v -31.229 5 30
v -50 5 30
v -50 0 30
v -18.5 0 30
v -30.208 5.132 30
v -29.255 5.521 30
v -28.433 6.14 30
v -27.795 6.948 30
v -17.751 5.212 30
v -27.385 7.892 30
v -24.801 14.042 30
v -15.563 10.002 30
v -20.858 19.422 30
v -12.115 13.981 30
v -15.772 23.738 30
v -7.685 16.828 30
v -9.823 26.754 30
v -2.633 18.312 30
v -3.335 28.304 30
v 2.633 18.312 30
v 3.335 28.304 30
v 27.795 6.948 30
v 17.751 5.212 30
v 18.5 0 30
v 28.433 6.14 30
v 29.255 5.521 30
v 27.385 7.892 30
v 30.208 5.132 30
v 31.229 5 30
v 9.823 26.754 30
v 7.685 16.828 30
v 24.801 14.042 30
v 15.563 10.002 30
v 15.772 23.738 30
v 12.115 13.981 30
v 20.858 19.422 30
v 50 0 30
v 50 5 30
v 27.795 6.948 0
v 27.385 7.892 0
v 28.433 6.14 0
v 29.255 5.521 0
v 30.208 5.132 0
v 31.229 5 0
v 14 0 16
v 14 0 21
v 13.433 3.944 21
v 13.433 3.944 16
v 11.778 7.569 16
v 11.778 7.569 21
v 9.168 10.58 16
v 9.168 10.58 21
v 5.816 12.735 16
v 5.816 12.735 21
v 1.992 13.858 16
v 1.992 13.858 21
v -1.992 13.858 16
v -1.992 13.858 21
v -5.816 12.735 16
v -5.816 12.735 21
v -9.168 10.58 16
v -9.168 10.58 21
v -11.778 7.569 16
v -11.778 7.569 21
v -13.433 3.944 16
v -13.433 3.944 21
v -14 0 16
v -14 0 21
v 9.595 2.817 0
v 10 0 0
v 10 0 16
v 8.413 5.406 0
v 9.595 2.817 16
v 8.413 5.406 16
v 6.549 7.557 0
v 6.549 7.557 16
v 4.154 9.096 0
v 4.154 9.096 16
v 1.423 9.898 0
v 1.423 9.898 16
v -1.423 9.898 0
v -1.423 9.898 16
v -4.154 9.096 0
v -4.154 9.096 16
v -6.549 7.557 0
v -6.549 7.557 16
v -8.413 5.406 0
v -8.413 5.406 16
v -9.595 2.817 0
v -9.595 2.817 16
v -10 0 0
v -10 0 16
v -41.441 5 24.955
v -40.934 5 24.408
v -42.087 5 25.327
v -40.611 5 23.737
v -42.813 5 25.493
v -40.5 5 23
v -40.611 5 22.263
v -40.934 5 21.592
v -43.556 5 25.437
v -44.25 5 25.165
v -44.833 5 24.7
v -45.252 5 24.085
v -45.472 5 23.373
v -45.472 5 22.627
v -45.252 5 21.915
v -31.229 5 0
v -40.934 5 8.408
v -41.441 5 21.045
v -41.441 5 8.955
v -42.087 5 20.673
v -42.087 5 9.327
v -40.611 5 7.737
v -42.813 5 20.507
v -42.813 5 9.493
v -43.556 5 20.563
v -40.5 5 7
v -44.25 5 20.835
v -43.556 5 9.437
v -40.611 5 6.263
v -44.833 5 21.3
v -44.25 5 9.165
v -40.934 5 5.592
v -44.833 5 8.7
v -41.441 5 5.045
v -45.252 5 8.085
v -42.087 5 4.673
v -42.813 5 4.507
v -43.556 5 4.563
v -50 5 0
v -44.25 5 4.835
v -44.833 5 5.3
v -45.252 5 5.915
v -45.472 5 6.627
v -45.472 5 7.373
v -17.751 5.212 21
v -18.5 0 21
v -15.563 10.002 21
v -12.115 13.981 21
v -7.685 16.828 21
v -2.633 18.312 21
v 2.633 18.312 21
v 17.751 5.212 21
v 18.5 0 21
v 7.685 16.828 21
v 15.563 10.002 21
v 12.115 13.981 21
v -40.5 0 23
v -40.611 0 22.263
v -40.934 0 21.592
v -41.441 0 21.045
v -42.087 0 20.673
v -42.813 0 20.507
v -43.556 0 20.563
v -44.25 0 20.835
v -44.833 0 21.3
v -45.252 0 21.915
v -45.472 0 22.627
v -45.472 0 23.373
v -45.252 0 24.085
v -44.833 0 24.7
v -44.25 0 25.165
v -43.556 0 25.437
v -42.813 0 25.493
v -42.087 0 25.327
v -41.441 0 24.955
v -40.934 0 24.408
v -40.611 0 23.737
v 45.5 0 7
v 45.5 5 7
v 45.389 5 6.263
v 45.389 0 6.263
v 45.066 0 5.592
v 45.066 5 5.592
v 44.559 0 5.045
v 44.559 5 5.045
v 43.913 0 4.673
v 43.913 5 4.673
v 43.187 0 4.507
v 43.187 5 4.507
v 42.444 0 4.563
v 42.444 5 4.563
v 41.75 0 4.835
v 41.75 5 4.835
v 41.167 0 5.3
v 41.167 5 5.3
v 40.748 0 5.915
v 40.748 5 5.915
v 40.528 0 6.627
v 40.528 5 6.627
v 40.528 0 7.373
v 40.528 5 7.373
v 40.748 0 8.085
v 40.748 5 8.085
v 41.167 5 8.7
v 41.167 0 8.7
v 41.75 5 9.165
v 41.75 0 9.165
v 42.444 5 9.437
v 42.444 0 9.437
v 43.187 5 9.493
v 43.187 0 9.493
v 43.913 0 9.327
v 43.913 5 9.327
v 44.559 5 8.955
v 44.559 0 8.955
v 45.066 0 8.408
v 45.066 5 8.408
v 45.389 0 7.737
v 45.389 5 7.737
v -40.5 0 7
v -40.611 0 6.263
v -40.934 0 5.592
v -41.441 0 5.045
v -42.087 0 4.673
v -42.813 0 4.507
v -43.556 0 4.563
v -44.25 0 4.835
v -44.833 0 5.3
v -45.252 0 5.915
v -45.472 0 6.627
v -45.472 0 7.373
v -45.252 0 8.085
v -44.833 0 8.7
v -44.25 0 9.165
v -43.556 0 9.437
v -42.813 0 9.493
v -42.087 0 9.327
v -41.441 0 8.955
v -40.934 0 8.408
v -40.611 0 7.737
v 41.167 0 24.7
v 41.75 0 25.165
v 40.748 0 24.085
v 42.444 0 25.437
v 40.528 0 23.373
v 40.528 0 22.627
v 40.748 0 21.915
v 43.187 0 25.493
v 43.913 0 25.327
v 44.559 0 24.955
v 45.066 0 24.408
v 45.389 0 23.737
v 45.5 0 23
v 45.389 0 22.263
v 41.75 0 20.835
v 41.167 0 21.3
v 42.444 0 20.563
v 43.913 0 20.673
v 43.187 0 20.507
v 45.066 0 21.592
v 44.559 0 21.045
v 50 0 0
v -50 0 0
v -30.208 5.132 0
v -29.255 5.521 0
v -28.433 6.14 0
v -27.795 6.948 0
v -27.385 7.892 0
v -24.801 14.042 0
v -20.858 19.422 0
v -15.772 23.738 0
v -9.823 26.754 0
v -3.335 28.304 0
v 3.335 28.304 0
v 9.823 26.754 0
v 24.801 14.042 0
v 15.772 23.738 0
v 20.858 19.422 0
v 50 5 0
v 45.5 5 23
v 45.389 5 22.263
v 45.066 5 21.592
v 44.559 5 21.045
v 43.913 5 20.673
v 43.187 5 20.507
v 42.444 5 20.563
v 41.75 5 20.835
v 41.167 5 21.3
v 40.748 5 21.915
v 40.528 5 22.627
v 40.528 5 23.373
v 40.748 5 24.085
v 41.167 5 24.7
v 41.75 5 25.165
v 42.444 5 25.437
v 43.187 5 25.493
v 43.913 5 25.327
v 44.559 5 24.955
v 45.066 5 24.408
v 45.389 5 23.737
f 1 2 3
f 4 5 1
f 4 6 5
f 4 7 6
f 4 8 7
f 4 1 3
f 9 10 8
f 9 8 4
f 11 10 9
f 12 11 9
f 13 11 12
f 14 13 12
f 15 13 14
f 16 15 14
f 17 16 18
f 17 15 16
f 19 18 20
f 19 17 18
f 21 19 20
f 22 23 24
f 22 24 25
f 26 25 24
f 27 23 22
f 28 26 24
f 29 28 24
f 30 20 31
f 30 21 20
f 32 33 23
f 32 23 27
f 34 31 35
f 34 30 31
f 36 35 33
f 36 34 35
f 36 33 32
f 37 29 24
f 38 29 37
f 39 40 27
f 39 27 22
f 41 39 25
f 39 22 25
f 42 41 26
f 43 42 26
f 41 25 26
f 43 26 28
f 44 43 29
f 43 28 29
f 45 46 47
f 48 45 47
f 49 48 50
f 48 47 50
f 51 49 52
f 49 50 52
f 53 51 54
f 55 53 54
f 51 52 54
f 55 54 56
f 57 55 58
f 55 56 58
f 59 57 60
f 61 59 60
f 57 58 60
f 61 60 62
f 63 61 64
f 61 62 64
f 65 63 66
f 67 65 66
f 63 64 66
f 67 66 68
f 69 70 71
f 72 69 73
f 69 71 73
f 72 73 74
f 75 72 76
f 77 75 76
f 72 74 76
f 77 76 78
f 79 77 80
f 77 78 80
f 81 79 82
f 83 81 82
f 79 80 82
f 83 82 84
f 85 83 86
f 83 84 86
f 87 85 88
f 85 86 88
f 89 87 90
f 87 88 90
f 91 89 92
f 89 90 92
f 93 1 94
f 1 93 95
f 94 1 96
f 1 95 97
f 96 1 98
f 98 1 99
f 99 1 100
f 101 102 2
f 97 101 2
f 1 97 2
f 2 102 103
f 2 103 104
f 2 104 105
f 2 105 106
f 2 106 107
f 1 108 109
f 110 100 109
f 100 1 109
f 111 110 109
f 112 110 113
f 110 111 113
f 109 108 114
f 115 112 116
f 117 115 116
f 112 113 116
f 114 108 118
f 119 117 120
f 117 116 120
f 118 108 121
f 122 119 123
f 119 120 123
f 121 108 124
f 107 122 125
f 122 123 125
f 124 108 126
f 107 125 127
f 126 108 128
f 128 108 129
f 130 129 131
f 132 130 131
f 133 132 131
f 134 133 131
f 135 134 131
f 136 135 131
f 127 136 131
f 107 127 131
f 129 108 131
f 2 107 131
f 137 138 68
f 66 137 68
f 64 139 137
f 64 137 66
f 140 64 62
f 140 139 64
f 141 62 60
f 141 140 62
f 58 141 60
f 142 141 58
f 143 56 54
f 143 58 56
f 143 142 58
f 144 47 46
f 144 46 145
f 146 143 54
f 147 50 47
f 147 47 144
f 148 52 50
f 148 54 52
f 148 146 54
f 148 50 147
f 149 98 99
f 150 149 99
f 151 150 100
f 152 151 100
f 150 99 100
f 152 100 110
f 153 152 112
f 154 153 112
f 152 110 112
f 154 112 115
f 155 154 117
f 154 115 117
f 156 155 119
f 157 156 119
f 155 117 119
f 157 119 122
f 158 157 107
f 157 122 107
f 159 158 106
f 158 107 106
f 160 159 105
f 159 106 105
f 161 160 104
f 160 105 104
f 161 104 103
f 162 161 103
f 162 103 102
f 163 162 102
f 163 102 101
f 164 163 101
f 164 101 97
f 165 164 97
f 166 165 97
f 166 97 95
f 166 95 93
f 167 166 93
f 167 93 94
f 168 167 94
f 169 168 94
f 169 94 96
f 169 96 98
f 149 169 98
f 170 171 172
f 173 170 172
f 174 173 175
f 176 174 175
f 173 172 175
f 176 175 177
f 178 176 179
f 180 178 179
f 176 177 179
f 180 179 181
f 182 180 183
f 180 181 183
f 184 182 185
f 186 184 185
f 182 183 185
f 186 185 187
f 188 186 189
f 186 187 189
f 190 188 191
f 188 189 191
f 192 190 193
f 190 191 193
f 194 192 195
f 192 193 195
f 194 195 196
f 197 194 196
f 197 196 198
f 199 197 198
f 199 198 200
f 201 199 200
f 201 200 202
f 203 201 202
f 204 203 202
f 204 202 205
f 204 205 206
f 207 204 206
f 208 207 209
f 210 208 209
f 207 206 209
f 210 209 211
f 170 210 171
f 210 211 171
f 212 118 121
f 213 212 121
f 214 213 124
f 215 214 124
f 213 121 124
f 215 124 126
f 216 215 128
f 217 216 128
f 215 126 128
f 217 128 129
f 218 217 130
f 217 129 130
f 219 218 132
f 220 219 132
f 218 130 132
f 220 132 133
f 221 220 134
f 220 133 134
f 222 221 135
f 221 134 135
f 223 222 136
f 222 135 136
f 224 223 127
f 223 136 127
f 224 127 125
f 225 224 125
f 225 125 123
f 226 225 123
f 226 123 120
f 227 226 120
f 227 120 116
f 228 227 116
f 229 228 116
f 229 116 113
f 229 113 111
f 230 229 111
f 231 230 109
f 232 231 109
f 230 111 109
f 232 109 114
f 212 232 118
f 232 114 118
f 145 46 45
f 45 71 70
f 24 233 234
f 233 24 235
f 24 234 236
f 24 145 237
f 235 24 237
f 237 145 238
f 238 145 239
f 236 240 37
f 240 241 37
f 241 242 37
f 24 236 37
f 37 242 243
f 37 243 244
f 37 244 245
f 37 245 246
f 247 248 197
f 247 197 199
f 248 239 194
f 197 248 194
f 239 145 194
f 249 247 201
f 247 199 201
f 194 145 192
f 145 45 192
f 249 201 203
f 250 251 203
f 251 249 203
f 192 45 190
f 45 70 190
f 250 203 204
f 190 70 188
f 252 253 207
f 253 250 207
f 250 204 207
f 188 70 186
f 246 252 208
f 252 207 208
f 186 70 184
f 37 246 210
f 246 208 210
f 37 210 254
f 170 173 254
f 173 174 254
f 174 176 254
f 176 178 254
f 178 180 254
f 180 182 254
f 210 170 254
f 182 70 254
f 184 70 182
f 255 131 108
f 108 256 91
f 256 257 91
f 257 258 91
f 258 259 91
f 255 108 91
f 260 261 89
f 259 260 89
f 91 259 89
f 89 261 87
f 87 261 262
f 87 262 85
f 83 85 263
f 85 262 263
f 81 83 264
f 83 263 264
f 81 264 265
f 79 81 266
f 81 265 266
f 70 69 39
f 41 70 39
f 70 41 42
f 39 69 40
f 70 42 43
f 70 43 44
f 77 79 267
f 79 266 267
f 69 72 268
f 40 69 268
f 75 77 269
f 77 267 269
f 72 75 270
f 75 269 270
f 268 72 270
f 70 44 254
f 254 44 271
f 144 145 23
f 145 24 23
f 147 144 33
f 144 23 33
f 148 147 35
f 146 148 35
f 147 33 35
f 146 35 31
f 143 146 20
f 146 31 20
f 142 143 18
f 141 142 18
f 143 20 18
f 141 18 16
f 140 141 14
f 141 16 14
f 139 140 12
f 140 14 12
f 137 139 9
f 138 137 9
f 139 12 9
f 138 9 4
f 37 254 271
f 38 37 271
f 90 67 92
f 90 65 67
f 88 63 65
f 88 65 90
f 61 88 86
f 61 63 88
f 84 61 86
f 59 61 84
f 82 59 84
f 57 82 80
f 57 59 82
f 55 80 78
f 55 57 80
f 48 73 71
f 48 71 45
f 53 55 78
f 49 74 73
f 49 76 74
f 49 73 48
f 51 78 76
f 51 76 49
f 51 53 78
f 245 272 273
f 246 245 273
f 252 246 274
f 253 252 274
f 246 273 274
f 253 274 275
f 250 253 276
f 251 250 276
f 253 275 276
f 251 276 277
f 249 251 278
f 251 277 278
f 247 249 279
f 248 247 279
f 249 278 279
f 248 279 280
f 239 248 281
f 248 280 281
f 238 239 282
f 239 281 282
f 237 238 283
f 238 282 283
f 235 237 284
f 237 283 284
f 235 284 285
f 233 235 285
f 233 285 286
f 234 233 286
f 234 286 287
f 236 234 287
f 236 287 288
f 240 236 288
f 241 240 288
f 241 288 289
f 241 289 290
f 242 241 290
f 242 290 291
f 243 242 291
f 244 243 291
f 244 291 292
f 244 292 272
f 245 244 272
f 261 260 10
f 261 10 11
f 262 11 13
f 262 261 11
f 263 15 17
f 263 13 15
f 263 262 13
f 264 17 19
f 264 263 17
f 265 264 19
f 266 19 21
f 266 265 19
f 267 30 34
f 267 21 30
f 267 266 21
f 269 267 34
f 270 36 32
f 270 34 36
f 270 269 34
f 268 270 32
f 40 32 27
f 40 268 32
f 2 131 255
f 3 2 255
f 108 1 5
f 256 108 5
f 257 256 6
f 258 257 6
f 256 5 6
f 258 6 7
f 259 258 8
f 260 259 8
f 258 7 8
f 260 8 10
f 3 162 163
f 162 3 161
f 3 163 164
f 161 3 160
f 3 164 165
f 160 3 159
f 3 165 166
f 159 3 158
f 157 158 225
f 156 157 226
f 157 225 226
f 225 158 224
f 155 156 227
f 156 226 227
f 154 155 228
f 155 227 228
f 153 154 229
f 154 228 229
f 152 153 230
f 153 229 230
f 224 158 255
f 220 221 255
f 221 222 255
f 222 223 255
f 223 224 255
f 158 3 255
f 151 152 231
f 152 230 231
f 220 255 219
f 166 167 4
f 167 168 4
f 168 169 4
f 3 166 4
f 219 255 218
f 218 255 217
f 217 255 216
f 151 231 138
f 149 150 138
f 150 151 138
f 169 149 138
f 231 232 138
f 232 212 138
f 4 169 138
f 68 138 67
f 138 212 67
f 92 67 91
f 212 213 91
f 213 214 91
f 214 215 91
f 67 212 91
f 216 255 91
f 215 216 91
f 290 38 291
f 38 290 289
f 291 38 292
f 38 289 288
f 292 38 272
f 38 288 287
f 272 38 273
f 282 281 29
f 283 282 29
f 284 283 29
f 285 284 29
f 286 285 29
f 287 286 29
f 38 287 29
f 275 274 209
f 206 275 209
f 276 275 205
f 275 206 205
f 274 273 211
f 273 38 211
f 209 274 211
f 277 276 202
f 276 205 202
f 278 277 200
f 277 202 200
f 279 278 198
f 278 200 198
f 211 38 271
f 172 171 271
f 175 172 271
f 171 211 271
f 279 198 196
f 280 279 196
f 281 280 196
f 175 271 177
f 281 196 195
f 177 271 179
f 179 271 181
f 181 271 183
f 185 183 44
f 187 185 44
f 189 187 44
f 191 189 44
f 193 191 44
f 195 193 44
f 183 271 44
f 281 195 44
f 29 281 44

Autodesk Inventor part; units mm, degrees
ref_plane "YZ Plane" through (0, 0, 0) normal (1, 0, 0) x (0, 1, 0)
ref_plane "XZ Plane" through (0, 0, 0) normal (0, 1, 0) x (-1, 0, 0)
ref_plane "XY Plane" through (0, 0, 0) normal (0, 0, 1) x (1, 0, 0)
sketch "草图1" plane through (0, 0, 0) normal (0, 0, 1) x (1, 0, 0)
  arc A0 (28.5, 0) -> (-28.5, 0) centre (0, 0) ccw
  line L0 (-50, 0) -> (50, 0)
  line L1 (50, 0) -> (50, 5)
  line L2 (50, 5) -> (-50, 5)
  line L3 (-50, 5) -> (-50, 0)
  dimension "d0" = 57
  dimension "d1" = 100
  dimension "d2" = 5
extrude "拉伸1" add sketch "草图1" along normal blind 30
sketch "草图2" plane through (0, 0, 30) normal (0, 0, 1) x (1, 0, 0)
  circle A0 centre (0, 0) radius 18.5
  dimension "d5" = 37
extrude "拉伸2" cut sketch "草图2" against normal blind 9
sketch "草图3" plane through (0, 0, 21) normal (0, 0, 1) x (1, 0, 0)
  circle A0 centre (0, 0) radius 14
  dimension "d8" = 28
extrude "拉伸3" cut sketch "草图3" against normal blind 5
sketch "草图4" plane through (0, 0, 16) normal (0, 0, 1) x (1, 0, 0)
  circle A0 centre (0, 0) radius 10
  dimension "d11" = 20
extrude "拉伸4" cut sketch "草图4" against normal through all
fillet "圆角1" radius 4 2 edges at (28.058, 5, 15) (-28.058, 5, 15)
sketch "草图5" plane through (50, 5, 30) normal (0, 1, 0) x (1, 0, 0)
  circle A0 centre (-7, 23) radius 2.5
  circle A1 centre (-7, 7) radius 2.5
  circle A2 centre (-93, 7) radius 2.5
  circle A3 centre (-93, 23) radius 2.5
  line L0 (-81.229, 30) -> (-100, 30) projected
  line L1 (-100, 30) -> (-100, 0) projected
  line L2 (-81.229, 0) -> (-100, 0) projected
  line L3 (0, 30) -> (-18.771, 30) projected
  line L4 (0, 30) -> (0, 0) projected
  line L5 (0, 0) -> (-18.771, 0) projected
  point P0 (-50, 30)
  dimension "d15" = 5
  dimension "d16" = 5
  dimension "d17" = 5
  dimension "d18" = 5
  dimension "d19" = 7
  dimension "d20" = 7
  dimension "d21" = 7
  dimension "d22" = 7
  dimension "d23" = 7
  dimension "d24" = 7
  dimension "d25" = 7
  dimension "d26" = 7
extrude "拉伸5" cut sketch "草图5" against normal through all
properties part number "砂轮架带动曲轴固定盖"
